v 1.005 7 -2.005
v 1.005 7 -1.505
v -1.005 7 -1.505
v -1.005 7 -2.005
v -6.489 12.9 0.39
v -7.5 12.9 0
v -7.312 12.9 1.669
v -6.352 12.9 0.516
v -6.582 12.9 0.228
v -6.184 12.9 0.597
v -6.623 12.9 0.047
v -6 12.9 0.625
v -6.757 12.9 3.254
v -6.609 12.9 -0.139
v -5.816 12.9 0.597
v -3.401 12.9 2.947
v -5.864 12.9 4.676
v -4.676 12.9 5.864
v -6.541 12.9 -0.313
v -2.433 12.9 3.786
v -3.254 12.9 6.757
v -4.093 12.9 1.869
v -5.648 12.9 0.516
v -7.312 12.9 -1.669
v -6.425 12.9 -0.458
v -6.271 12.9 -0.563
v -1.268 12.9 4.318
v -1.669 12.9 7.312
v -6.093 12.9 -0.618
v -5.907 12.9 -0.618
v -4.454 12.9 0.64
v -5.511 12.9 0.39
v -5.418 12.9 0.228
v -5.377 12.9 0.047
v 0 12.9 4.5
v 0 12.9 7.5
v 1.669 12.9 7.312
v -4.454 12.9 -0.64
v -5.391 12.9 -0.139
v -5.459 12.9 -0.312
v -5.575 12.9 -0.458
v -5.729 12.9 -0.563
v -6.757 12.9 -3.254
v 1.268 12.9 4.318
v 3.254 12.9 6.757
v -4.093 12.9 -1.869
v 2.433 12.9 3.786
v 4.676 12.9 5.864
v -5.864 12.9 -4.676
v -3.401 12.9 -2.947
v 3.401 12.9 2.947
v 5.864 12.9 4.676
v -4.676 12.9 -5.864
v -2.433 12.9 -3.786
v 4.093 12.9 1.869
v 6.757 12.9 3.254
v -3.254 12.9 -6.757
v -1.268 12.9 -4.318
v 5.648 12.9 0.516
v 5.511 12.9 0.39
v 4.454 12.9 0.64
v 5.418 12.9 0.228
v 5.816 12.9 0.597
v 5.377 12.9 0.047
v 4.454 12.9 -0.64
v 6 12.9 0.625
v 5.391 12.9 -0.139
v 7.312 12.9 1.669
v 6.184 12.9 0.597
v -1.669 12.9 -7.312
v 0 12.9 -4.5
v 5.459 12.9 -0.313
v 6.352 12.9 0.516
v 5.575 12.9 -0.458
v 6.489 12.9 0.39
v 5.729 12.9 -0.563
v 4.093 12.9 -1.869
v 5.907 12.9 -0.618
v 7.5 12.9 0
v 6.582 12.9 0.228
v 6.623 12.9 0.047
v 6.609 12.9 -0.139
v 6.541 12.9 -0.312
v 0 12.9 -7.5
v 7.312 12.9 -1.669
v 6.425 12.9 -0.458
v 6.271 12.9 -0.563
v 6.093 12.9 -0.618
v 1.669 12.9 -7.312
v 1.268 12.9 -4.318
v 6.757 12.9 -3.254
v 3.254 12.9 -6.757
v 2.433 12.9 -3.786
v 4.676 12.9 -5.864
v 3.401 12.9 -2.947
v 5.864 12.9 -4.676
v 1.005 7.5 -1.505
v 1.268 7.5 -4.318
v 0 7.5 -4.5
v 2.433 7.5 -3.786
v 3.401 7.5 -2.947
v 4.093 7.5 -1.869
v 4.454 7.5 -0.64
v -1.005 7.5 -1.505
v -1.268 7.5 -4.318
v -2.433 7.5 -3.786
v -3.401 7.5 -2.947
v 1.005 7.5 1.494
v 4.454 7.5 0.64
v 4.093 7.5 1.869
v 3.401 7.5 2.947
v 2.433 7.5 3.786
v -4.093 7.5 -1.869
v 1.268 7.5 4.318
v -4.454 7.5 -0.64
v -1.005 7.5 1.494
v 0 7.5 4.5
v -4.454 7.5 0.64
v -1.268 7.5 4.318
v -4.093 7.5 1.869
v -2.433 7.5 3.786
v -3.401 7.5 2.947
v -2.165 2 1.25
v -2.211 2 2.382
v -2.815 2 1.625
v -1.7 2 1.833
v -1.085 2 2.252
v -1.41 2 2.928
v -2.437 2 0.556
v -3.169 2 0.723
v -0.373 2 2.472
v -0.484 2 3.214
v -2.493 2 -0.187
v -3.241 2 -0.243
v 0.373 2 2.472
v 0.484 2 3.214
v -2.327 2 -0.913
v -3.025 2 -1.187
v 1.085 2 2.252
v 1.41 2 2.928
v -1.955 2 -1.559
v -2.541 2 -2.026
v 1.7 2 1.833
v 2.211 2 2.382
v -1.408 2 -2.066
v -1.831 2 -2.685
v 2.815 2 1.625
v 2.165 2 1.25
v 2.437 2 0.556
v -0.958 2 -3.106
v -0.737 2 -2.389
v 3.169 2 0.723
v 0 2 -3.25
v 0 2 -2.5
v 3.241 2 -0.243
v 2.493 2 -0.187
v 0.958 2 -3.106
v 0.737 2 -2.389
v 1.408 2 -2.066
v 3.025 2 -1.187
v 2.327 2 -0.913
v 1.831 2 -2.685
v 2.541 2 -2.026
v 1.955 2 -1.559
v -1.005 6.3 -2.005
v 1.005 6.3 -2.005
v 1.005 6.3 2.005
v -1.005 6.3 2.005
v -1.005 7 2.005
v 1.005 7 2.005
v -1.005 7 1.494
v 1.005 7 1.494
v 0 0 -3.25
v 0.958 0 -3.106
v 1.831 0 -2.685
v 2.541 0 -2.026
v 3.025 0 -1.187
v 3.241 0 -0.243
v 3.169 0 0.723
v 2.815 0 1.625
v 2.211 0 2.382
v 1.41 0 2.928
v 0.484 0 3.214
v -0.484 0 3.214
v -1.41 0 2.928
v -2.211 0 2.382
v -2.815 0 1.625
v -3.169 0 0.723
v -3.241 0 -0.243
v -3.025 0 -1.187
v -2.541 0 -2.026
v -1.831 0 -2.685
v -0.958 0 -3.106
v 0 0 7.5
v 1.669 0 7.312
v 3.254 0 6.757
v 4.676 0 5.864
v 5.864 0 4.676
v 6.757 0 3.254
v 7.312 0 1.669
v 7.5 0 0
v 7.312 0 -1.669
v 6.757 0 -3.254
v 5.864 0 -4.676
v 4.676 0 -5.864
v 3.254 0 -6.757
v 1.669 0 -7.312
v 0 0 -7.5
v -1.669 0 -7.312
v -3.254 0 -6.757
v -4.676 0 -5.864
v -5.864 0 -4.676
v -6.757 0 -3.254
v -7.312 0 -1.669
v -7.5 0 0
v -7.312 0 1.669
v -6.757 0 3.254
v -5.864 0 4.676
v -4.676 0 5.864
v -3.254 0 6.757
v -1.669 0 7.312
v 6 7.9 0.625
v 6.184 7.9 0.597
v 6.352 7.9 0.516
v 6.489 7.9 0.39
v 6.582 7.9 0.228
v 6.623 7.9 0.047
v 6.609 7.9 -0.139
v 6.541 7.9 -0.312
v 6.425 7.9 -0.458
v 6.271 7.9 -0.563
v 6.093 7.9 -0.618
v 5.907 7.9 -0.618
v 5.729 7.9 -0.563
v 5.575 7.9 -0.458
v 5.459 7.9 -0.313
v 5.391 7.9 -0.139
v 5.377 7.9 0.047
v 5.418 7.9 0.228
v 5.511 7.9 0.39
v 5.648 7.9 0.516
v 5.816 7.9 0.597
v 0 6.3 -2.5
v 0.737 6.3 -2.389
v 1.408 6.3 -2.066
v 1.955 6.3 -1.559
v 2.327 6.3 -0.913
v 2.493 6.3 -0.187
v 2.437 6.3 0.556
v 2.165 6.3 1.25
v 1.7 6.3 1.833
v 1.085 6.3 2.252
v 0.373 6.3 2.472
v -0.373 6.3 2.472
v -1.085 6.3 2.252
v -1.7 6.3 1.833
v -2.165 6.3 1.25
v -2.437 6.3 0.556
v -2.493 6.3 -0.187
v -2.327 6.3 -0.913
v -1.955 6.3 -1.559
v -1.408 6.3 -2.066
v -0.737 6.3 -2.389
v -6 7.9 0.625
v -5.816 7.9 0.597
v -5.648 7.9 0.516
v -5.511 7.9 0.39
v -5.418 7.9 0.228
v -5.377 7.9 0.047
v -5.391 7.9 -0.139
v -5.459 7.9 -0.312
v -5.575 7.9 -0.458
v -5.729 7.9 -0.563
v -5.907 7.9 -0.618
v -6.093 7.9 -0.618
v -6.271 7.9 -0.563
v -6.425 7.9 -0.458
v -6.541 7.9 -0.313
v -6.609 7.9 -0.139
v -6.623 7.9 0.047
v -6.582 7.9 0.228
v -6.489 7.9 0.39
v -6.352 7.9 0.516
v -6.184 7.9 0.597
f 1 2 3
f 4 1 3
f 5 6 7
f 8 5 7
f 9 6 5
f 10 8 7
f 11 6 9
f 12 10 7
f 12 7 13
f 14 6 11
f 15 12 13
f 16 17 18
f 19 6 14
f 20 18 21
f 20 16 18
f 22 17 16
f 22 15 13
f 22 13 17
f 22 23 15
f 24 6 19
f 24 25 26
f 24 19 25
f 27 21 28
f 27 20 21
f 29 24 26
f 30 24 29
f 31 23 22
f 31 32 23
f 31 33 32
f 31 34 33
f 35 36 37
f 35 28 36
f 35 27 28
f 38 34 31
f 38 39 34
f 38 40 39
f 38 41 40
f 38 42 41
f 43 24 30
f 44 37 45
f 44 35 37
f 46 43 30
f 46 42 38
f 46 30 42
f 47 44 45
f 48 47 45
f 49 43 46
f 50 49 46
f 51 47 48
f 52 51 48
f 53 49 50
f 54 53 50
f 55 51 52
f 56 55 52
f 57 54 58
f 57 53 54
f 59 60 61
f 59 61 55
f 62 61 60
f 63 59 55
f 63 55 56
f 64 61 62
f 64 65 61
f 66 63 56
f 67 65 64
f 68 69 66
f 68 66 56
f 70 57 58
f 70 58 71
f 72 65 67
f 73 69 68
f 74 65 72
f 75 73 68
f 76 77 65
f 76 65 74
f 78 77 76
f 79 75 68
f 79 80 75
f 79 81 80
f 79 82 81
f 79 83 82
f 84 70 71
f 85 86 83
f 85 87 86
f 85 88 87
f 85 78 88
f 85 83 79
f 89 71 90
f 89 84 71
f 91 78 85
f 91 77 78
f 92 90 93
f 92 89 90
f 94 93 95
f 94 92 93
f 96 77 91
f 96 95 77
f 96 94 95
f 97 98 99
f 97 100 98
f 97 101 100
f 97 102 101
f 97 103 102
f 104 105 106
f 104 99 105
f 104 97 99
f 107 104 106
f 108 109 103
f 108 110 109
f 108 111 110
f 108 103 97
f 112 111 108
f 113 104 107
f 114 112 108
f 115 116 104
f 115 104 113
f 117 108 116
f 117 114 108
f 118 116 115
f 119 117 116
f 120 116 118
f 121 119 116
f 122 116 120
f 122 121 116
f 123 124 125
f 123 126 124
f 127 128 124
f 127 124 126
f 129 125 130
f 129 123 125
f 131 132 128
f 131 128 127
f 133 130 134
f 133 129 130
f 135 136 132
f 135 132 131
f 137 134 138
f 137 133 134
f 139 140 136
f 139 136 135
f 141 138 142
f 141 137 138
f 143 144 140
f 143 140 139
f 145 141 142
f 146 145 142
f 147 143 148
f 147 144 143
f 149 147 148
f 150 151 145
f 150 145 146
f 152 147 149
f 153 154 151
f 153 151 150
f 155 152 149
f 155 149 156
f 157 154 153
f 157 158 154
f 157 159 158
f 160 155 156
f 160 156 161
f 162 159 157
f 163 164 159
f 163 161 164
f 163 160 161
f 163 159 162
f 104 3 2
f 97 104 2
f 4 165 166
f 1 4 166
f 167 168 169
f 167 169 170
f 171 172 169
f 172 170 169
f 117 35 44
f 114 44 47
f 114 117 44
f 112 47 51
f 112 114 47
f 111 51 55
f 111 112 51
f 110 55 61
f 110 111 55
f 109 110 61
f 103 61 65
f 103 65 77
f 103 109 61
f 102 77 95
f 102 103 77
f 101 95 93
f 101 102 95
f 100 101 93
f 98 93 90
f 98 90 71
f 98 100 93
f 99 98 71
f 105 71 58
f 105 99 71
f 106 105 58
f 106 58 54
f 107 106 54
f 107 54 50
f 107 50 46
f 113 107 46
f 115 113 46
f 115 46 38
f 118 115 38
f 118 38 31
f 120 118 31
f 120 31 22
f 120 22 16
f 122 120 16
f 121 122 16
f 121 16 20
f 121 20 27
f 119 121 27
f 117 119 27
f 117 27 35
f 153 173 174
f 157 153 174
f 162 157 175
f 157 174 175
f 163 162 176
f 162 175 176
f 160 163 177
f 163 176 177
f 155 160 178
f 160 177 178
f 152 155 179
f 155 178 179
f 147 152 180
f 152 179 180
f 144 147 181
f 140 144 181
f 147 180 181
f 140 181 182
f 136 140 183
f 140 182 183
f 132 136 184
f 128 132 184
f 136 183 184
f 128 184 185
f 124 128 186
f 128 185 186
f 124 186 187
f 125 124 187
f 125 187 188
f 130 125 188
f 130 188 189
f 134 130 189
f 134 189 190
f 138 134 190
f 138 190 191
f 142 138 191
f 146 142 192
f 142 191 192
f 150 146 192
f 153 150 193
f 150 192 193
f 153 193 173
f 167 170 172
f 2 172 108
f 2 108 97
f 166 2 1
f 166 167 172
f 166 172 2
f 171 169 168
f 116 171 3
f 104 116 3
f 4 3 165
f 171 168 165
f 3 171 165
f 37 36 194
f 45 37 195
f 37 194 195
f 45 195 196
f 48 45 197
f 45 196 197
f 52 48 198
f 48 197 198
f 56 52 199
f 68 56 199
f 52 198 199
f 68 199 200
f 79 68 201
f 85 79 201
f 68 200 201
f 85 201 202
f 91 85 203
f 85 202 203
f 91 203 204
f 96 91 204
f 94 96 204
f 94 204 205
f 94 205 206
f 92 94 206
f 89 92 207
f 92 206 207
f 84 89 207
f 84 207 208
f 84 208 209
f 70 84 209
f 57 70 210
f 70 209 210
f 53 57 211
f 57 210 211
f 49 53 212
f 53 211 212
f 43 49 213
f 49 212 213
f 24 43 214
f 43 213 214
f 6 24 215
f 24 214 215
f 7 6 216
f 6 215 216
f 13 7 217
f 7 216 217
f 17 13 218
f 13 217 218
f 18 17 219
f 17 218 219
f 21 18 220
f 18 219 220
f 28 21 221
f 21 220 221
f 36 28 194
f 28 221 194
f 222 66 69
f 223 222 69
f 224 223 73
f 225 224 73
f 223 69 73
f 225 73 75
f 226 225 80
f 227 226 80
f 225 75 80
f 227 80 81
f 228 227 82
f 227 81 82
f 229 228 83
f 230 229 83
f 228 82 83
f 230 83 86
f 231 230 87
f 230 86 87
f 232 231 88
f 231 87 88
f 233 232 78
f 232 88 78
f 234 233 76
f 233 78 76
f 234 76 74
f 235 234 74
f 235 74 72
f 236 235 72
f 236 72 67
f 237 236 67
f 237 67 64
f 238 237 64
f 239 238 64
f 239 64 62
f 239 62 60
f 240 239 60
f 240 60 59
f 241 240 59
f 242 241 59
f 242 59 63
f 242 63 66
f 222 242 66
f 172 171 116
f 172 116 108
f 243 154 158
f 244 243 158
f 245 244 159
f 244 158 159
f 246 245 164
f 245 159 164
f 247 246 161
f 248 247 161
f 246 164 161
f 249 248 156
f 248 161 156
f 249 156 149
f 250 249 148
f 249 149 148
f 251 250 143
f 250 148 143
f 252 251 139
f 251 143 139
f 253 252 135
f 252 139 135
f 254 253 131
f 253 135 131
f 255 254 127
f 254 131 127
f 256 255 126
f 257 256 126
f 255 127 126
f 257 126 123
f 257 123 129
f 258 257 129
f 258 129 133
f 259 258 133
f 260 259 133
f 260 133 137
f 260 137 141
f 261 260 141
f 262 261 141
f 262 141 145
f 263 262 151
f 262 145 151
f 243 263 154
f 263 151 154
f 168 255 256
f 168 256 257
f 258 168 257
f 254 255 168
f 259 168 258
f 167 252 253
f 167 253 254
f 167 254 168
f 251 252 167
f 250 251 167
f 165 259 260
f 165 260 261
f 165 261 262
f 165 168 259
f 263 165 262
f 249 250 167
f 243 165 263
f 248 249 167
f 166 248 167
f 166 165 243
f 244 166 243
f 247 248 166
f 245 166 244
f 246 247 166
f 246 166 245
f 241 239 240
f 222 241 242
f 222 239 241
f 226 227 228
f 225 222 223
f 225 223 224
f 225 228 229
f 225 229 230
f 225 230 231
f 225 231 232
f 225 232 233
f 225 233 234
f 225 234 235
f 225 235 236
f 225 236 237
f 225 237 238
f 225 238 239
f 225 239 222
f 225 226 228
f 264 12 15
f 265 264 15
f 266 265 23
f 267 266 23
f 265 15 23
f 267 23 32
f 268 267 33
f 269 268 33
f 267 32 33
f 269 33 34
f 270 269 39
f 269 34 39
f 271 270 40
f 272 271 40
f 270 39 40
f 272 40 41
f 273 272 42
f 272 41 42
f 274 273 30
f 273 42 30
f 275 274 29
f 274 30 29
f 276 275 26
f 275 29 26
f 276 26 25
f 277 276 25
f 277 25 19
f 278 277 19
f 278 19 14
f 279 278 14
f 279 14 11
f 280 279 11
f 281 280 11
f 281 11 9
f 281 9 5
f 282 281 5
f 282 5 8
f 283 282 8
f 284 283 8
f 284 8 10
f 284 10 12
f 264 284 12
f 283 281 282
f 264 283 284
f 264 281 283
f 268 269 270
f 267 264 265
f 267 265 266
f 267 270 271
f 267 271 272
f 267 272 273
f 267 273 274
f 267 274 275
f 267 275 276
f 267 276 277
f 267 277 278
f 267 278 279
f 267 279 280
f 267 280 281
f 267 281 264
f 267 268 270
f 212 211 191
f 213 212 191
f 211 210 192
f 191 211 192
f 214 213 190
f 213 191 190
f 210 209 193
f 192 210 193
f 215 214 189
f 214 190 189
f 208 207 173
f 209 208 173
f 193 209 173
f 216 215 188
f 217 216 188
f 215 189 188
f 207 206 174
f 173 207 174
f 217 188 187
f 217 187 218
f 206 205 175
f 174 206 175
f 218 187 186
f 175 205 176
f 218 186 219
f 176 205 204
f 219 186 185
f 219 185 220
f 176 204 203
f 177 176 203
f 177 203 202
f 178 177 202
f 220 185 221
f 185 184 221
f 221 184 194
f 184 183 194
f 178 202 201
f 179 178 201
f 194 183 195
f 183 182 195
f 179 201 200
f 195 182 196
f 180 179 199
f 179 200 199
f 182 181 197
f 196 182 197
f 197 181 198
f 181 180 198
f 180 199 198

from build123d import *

# Parameters (mm, degrees)
SKETCH_1_R           = 4
EXTRUDE_1_DEPTH      = 11
SKETCH_2_R           = 3.01
CUT_EXTRUDE_2_DEPTH  = 2
SKETCH_3_R           = 2.5
CUT_EXTRUDE_3_DEPTH  = 4.3
SKETCH_4_W           = 2.01
SKETCH_4_H           = 4.01
CUT_EXTRUDE_4_DEPTH  = 0.7
SKETCH_5_R           = 2.5
CUT_EXTRUDE_5_DEPTH  = 1
SKETCH_7_R           = 4
CUT_EXTRUDE_6_DEPTH  = 10
SKETCH_12_R          = 3.25
CUT_EXTRUDE_7_DEPTH  = 2
SKETCH_13_R          = 4
SKETCH_13_R_2        = 2.5
EXTRUDE_2_DEPTH      = 2
CUT_EXTRUDE_START    = -3
SKETCH_14_R          = 4
SKETCH_14_R_2        = 2.5
CUT_EXTRUDE_8_DEPTH  = 3
SKETCH_15_R          = 7
SKETCH_15_R_2        = 5
EXTRUDE_3_DEPTH      = 14.9
EXTRUDE_START        = 7
SKETCH_16_R          = 7
SKETCH_16_R_2        = 4
EXTRUDE_4_DEPTH      = 7
SKETCH_17_R          = 0.8
CUT_EXTRUDE_10_DEPTH = 5
SKETCH_18_R          = 5
SKETCH_18_W          = 2.01
SKETCH_18_H          = 2.999191688
EXTRUDE_5_DEPTH      = 0.5
SKETCH_20_R          = 0.625
CUT_EXTRUDE_11_DEPTH = 9
CUT_EXTRUDE_START_2  = -9
SKETCH_21_R          = 7
CUT_EXTRUDE_12_DEPTH = 9
EXTRUDE_START_2      = -12.9
SKETCH_22_R          = 7.5
SKETCH_22_R_2        = 7
EXTRUDE_7_DEPTH      = 12.9
EXTRUDE_START_3      = -10
SKETCH_23_R          = 5
SKETCH_23_R_2        = 4.5
EXTRUDE_8_DEPTH      = 10


with BuildPart() as part:
    # Эскиз1 → Бобышка-Вытянуть1 (new body)
    with BuildSketch(Plane(origin=(0, 0, 0), x_dir=(1, 0, 0), z_dir=(0, 1, 0))):
        with Locations(Location((0, 0, 0), (0, 0, 270))):
            Circle(SKETCH_1_R)
    extrude(amount=EXTRUDE_1_DEPTH)

    # Эскиз2 → Вырез-Вытянуть2 (cut)
    with BuildSketch(Plane.XZ):
        with Locations(Location((0, 0, 0), (0, 0, 270))):
            Circle(SKETCH_2_R)
    extrude(amount=-CUT_EXTRUDE_2_DEPTH, mode=Mode.SUBTRACT)

    # Эскиз3 → Вырез-Вытянуть3 (cut)
    with BuildSketch(Plane.XZ.offset(-2)):
        with Locations(Location((0, 0, 0), (0, 0, 270))):
            Circle(SKETCH_3_R)
    extrude(amount=-CUT_EXTRUDE_3_DEPTH, mode=Mode.SUBTRACT)

    # Эскиз4 → Вырез-Вытянуть4 (cut)
    with BuildSketch(Plane.XZ.offset(-6.3)):
        Rectangle(SKETCH_4_W, SKETCH_4_H)
    extrude(amount=-CUT_EXTRUDE_4_DEPTH, mode=Mode.SUBTRACT)

    # Эскиз5 → Вырез-Вытянуть5 (cut)
    with BuildSketch(Plane.XZ.offset(-7)):
        with Locations(Location((0, 0, 0), (0, 0, 270))):
            Circle(SKETCH_5_R)
    extrude(amount=-CUT_EXTRUDE_5_DEPTH, mode=Mode.SUBTRACT)

    # Эскиз7 → Вырез-Вытянуть6 (cut)
    with BuildSketch(Plane.XZ.offset(-8)):
        with Locations(Location((0, 0, 0), (0, 0, 270))):
            Circle(SKETCH_7_R)
    extrude(amount=-CUT_EXTRUDE_6_DEPTH, mode=Mode.SUBTRACT)

    # Эскиз12 → Вырез-Вытянуть7 (cut)
    with BuildSketch(Plane.XZ):
        with Locations(Location((0, 0, 0), (0, 0, 270))):
            Circle(SKETCH_12_R)
    extrude(amount=-CUT_EXTRUDE_7_DEPTH, mode=Mode.SUBTRACT)

    # Эскиз13 → Бобышка-Вытянуть2 (add)
    with BuildSketch(Plane(origin=(0, 8, 0), x_dir=(1, 0, 0), z_dir=(0, 1, 0))):
        with Locations(Location((0, 0, 0), (0, 0, 270))):
            Circle(SKETCH_13_R)
        with Locations(Location((0, 0, 0), (0, 0, 90))):
            Circle(SKETCH_13_R_2, mode=Mode.SUBTRACT)
    extrude(amount=EXTRUDE_2_DEPTH)

    # Эскиз14 → Вырез-Вытянуть8 (cut)
    with BuildSketch(Plane(origin=(0, 10, 0), x_dir=(1, 0, 0), z_dir=(0, 1, 0)).offset(CUT_EXTRUDE_START)):
        with Locations(Location((0, 0, 0), (0, 0, 270))):
            Circle(SKETCH_14_R)
        with Locations(Location((0, 0, 0), (0, 0, 90))):
            Circle(SKETCH_14_R_2, mode=Mode.SUBTRACT)
    extrude(amount=CUT_EXTRUDE_8_DEPTH, mode=Mode.SUBTRACT)



with BuildPart() as body_2:
    # Эскиз15 → Бобышка-Вытянуть3 (new body)
    with BuildSketch(Plane(origin=(0, 7, 0), x_dir=(1, 0, 0), z_dir=(0, 1, 0))):
        with Locations(Location((0, 0, 0), (0, 0, 270))):
            Circle(SKETCH_15_R)
        with Locations(Location((0, 0, 0), (0, 0, 270))):
            Circle(SKETCH_15_R_2, mode=Mode.SUBTRACT)
    extrude(amount=EXTRUDE_3_DEPTH)


with BuildPart() as part_1:
    add(part.part)

    add(body_2.part)  # Бобышка-Вытянуть4 merges body 2
    # Эскиз16 → Бобышка-Вытянуть4 (add)
    with BuildSketch(Plane.XZ.offset(-7).offset(EXTRUDE_START)):
        with Locations(Location((0, 0, 0), (0, 0, 90))):
            Circle(SKETCH_16_R)
        Circle(SKETCH_16_R_2, mode=Mode.SUBTRACT)
    extrude(amount=-EXTRUDE_4_DEPTH)

    # Эскиз17 → Вырез-Вытянуть10 (cut)
    with BuildSketch(Plane(origin=(0, 21.9, 0), x_dir=(1, 0, 0), z_dir=(0, 1, 0))):
        with Locations(Location((6, 0, 0), (0, 0, 270))):
            Circle(SKETCH_17_R)
        with Locations(Location((-6, 0, 0), (0, 0, 90))):
            Circle(SKETCH_17_R)
    extrude(amount=-CUT_EXTRUDE_10_DEPTH, mode=Mode.SUBTRACT)

    # Эскиз18 → Бобышка-Вытянуть5 (add)
    with BuildSketch(Plane(origin=(0, 7, 0), x_dir=(1, 0, 0), z_dir=(0, 1, 0))):
        with Locations(Location((0, 0, 0), (0, 0, 180))):
            Circle(SKETCH_18_R)
        with Locations((0, 0.005404156)):
            Rectangle(SKETCH_18_W, SKETCH_18_H, mode=Mode.SUBTRACT)
    extrude(amount=EXTRUDE_5_DEPTH)

    # Эскиз20 → Вырез-Вытянуть11 (cut)
    with BuildSketch(Plane(origin=(0, 16.9, 0), x_dir=(1, 0, 0), z_dir=(0, 1, 0))):
        with Locations(Location((6, 0, 0), (0, 0, 270))):
            Circle(SKETCH_20_R)
        with Locations(Location((-6, 0, 0), (0, 0, 270))):
            Circle(SKETCH_20_R)
    extrude(amount=-CUT_EXTRUDE_11_DEPTH, mode=Mode.SUBTRACT)

    # Эскиз21 → Вырез-Вытянуть12 (cut)
    with BuildSketch(Plane(origin=(0, 21.9, 0), x_dir=(1, 0, 0), z_dir=(0, 1, 0)).offset(CUT_EXTRUDE_START_2)):
        with Locations(Location((0, 0, 0), (0, 0, 270))):
            Circle(SKETCH_21_R)
    extrude(amount=CUT_EXTRUDE_12_DEPTH, mode=Mode.SUBTRACT)

    # Эскиз22 → Бобышка-Вытянуть7 (add)
    with BuildSketch(Plane(origin=(0, 12.9, 0), x_dir=(1, 0, 0), z_dir=(0, 1, 0)).offset(EXTRUDE_START_2)):
        with Locations(Location((0, 0, 0), (0, 0, 270))):
            Circle(SKETCH_22_R)
        Circle(SKETCH_22_R_2, mode=Mode.SUBTRACT)
    extrude(amount=EXTRUDE_7_DEPTH)

    # Эскиз23 → Бобышка-Вытянуть8 (add)
    with BuildSketch(Plane(origin=(0, 12.9, 0), x_dir=(1, 0, 0), z_dir=(0, 1, 0)).offset(EXTRUDE_START_3)):
        Circle(SKETCH_23_R)
        with Locations(Location((0, 0, 0), (0, 0, 270))):
            Circle(SKETCH_23_R_2, mode=Mode.SUBTRACT)
    extrude(amount=EXTRUDE_8_DEPTH)


solid = part_1.part
